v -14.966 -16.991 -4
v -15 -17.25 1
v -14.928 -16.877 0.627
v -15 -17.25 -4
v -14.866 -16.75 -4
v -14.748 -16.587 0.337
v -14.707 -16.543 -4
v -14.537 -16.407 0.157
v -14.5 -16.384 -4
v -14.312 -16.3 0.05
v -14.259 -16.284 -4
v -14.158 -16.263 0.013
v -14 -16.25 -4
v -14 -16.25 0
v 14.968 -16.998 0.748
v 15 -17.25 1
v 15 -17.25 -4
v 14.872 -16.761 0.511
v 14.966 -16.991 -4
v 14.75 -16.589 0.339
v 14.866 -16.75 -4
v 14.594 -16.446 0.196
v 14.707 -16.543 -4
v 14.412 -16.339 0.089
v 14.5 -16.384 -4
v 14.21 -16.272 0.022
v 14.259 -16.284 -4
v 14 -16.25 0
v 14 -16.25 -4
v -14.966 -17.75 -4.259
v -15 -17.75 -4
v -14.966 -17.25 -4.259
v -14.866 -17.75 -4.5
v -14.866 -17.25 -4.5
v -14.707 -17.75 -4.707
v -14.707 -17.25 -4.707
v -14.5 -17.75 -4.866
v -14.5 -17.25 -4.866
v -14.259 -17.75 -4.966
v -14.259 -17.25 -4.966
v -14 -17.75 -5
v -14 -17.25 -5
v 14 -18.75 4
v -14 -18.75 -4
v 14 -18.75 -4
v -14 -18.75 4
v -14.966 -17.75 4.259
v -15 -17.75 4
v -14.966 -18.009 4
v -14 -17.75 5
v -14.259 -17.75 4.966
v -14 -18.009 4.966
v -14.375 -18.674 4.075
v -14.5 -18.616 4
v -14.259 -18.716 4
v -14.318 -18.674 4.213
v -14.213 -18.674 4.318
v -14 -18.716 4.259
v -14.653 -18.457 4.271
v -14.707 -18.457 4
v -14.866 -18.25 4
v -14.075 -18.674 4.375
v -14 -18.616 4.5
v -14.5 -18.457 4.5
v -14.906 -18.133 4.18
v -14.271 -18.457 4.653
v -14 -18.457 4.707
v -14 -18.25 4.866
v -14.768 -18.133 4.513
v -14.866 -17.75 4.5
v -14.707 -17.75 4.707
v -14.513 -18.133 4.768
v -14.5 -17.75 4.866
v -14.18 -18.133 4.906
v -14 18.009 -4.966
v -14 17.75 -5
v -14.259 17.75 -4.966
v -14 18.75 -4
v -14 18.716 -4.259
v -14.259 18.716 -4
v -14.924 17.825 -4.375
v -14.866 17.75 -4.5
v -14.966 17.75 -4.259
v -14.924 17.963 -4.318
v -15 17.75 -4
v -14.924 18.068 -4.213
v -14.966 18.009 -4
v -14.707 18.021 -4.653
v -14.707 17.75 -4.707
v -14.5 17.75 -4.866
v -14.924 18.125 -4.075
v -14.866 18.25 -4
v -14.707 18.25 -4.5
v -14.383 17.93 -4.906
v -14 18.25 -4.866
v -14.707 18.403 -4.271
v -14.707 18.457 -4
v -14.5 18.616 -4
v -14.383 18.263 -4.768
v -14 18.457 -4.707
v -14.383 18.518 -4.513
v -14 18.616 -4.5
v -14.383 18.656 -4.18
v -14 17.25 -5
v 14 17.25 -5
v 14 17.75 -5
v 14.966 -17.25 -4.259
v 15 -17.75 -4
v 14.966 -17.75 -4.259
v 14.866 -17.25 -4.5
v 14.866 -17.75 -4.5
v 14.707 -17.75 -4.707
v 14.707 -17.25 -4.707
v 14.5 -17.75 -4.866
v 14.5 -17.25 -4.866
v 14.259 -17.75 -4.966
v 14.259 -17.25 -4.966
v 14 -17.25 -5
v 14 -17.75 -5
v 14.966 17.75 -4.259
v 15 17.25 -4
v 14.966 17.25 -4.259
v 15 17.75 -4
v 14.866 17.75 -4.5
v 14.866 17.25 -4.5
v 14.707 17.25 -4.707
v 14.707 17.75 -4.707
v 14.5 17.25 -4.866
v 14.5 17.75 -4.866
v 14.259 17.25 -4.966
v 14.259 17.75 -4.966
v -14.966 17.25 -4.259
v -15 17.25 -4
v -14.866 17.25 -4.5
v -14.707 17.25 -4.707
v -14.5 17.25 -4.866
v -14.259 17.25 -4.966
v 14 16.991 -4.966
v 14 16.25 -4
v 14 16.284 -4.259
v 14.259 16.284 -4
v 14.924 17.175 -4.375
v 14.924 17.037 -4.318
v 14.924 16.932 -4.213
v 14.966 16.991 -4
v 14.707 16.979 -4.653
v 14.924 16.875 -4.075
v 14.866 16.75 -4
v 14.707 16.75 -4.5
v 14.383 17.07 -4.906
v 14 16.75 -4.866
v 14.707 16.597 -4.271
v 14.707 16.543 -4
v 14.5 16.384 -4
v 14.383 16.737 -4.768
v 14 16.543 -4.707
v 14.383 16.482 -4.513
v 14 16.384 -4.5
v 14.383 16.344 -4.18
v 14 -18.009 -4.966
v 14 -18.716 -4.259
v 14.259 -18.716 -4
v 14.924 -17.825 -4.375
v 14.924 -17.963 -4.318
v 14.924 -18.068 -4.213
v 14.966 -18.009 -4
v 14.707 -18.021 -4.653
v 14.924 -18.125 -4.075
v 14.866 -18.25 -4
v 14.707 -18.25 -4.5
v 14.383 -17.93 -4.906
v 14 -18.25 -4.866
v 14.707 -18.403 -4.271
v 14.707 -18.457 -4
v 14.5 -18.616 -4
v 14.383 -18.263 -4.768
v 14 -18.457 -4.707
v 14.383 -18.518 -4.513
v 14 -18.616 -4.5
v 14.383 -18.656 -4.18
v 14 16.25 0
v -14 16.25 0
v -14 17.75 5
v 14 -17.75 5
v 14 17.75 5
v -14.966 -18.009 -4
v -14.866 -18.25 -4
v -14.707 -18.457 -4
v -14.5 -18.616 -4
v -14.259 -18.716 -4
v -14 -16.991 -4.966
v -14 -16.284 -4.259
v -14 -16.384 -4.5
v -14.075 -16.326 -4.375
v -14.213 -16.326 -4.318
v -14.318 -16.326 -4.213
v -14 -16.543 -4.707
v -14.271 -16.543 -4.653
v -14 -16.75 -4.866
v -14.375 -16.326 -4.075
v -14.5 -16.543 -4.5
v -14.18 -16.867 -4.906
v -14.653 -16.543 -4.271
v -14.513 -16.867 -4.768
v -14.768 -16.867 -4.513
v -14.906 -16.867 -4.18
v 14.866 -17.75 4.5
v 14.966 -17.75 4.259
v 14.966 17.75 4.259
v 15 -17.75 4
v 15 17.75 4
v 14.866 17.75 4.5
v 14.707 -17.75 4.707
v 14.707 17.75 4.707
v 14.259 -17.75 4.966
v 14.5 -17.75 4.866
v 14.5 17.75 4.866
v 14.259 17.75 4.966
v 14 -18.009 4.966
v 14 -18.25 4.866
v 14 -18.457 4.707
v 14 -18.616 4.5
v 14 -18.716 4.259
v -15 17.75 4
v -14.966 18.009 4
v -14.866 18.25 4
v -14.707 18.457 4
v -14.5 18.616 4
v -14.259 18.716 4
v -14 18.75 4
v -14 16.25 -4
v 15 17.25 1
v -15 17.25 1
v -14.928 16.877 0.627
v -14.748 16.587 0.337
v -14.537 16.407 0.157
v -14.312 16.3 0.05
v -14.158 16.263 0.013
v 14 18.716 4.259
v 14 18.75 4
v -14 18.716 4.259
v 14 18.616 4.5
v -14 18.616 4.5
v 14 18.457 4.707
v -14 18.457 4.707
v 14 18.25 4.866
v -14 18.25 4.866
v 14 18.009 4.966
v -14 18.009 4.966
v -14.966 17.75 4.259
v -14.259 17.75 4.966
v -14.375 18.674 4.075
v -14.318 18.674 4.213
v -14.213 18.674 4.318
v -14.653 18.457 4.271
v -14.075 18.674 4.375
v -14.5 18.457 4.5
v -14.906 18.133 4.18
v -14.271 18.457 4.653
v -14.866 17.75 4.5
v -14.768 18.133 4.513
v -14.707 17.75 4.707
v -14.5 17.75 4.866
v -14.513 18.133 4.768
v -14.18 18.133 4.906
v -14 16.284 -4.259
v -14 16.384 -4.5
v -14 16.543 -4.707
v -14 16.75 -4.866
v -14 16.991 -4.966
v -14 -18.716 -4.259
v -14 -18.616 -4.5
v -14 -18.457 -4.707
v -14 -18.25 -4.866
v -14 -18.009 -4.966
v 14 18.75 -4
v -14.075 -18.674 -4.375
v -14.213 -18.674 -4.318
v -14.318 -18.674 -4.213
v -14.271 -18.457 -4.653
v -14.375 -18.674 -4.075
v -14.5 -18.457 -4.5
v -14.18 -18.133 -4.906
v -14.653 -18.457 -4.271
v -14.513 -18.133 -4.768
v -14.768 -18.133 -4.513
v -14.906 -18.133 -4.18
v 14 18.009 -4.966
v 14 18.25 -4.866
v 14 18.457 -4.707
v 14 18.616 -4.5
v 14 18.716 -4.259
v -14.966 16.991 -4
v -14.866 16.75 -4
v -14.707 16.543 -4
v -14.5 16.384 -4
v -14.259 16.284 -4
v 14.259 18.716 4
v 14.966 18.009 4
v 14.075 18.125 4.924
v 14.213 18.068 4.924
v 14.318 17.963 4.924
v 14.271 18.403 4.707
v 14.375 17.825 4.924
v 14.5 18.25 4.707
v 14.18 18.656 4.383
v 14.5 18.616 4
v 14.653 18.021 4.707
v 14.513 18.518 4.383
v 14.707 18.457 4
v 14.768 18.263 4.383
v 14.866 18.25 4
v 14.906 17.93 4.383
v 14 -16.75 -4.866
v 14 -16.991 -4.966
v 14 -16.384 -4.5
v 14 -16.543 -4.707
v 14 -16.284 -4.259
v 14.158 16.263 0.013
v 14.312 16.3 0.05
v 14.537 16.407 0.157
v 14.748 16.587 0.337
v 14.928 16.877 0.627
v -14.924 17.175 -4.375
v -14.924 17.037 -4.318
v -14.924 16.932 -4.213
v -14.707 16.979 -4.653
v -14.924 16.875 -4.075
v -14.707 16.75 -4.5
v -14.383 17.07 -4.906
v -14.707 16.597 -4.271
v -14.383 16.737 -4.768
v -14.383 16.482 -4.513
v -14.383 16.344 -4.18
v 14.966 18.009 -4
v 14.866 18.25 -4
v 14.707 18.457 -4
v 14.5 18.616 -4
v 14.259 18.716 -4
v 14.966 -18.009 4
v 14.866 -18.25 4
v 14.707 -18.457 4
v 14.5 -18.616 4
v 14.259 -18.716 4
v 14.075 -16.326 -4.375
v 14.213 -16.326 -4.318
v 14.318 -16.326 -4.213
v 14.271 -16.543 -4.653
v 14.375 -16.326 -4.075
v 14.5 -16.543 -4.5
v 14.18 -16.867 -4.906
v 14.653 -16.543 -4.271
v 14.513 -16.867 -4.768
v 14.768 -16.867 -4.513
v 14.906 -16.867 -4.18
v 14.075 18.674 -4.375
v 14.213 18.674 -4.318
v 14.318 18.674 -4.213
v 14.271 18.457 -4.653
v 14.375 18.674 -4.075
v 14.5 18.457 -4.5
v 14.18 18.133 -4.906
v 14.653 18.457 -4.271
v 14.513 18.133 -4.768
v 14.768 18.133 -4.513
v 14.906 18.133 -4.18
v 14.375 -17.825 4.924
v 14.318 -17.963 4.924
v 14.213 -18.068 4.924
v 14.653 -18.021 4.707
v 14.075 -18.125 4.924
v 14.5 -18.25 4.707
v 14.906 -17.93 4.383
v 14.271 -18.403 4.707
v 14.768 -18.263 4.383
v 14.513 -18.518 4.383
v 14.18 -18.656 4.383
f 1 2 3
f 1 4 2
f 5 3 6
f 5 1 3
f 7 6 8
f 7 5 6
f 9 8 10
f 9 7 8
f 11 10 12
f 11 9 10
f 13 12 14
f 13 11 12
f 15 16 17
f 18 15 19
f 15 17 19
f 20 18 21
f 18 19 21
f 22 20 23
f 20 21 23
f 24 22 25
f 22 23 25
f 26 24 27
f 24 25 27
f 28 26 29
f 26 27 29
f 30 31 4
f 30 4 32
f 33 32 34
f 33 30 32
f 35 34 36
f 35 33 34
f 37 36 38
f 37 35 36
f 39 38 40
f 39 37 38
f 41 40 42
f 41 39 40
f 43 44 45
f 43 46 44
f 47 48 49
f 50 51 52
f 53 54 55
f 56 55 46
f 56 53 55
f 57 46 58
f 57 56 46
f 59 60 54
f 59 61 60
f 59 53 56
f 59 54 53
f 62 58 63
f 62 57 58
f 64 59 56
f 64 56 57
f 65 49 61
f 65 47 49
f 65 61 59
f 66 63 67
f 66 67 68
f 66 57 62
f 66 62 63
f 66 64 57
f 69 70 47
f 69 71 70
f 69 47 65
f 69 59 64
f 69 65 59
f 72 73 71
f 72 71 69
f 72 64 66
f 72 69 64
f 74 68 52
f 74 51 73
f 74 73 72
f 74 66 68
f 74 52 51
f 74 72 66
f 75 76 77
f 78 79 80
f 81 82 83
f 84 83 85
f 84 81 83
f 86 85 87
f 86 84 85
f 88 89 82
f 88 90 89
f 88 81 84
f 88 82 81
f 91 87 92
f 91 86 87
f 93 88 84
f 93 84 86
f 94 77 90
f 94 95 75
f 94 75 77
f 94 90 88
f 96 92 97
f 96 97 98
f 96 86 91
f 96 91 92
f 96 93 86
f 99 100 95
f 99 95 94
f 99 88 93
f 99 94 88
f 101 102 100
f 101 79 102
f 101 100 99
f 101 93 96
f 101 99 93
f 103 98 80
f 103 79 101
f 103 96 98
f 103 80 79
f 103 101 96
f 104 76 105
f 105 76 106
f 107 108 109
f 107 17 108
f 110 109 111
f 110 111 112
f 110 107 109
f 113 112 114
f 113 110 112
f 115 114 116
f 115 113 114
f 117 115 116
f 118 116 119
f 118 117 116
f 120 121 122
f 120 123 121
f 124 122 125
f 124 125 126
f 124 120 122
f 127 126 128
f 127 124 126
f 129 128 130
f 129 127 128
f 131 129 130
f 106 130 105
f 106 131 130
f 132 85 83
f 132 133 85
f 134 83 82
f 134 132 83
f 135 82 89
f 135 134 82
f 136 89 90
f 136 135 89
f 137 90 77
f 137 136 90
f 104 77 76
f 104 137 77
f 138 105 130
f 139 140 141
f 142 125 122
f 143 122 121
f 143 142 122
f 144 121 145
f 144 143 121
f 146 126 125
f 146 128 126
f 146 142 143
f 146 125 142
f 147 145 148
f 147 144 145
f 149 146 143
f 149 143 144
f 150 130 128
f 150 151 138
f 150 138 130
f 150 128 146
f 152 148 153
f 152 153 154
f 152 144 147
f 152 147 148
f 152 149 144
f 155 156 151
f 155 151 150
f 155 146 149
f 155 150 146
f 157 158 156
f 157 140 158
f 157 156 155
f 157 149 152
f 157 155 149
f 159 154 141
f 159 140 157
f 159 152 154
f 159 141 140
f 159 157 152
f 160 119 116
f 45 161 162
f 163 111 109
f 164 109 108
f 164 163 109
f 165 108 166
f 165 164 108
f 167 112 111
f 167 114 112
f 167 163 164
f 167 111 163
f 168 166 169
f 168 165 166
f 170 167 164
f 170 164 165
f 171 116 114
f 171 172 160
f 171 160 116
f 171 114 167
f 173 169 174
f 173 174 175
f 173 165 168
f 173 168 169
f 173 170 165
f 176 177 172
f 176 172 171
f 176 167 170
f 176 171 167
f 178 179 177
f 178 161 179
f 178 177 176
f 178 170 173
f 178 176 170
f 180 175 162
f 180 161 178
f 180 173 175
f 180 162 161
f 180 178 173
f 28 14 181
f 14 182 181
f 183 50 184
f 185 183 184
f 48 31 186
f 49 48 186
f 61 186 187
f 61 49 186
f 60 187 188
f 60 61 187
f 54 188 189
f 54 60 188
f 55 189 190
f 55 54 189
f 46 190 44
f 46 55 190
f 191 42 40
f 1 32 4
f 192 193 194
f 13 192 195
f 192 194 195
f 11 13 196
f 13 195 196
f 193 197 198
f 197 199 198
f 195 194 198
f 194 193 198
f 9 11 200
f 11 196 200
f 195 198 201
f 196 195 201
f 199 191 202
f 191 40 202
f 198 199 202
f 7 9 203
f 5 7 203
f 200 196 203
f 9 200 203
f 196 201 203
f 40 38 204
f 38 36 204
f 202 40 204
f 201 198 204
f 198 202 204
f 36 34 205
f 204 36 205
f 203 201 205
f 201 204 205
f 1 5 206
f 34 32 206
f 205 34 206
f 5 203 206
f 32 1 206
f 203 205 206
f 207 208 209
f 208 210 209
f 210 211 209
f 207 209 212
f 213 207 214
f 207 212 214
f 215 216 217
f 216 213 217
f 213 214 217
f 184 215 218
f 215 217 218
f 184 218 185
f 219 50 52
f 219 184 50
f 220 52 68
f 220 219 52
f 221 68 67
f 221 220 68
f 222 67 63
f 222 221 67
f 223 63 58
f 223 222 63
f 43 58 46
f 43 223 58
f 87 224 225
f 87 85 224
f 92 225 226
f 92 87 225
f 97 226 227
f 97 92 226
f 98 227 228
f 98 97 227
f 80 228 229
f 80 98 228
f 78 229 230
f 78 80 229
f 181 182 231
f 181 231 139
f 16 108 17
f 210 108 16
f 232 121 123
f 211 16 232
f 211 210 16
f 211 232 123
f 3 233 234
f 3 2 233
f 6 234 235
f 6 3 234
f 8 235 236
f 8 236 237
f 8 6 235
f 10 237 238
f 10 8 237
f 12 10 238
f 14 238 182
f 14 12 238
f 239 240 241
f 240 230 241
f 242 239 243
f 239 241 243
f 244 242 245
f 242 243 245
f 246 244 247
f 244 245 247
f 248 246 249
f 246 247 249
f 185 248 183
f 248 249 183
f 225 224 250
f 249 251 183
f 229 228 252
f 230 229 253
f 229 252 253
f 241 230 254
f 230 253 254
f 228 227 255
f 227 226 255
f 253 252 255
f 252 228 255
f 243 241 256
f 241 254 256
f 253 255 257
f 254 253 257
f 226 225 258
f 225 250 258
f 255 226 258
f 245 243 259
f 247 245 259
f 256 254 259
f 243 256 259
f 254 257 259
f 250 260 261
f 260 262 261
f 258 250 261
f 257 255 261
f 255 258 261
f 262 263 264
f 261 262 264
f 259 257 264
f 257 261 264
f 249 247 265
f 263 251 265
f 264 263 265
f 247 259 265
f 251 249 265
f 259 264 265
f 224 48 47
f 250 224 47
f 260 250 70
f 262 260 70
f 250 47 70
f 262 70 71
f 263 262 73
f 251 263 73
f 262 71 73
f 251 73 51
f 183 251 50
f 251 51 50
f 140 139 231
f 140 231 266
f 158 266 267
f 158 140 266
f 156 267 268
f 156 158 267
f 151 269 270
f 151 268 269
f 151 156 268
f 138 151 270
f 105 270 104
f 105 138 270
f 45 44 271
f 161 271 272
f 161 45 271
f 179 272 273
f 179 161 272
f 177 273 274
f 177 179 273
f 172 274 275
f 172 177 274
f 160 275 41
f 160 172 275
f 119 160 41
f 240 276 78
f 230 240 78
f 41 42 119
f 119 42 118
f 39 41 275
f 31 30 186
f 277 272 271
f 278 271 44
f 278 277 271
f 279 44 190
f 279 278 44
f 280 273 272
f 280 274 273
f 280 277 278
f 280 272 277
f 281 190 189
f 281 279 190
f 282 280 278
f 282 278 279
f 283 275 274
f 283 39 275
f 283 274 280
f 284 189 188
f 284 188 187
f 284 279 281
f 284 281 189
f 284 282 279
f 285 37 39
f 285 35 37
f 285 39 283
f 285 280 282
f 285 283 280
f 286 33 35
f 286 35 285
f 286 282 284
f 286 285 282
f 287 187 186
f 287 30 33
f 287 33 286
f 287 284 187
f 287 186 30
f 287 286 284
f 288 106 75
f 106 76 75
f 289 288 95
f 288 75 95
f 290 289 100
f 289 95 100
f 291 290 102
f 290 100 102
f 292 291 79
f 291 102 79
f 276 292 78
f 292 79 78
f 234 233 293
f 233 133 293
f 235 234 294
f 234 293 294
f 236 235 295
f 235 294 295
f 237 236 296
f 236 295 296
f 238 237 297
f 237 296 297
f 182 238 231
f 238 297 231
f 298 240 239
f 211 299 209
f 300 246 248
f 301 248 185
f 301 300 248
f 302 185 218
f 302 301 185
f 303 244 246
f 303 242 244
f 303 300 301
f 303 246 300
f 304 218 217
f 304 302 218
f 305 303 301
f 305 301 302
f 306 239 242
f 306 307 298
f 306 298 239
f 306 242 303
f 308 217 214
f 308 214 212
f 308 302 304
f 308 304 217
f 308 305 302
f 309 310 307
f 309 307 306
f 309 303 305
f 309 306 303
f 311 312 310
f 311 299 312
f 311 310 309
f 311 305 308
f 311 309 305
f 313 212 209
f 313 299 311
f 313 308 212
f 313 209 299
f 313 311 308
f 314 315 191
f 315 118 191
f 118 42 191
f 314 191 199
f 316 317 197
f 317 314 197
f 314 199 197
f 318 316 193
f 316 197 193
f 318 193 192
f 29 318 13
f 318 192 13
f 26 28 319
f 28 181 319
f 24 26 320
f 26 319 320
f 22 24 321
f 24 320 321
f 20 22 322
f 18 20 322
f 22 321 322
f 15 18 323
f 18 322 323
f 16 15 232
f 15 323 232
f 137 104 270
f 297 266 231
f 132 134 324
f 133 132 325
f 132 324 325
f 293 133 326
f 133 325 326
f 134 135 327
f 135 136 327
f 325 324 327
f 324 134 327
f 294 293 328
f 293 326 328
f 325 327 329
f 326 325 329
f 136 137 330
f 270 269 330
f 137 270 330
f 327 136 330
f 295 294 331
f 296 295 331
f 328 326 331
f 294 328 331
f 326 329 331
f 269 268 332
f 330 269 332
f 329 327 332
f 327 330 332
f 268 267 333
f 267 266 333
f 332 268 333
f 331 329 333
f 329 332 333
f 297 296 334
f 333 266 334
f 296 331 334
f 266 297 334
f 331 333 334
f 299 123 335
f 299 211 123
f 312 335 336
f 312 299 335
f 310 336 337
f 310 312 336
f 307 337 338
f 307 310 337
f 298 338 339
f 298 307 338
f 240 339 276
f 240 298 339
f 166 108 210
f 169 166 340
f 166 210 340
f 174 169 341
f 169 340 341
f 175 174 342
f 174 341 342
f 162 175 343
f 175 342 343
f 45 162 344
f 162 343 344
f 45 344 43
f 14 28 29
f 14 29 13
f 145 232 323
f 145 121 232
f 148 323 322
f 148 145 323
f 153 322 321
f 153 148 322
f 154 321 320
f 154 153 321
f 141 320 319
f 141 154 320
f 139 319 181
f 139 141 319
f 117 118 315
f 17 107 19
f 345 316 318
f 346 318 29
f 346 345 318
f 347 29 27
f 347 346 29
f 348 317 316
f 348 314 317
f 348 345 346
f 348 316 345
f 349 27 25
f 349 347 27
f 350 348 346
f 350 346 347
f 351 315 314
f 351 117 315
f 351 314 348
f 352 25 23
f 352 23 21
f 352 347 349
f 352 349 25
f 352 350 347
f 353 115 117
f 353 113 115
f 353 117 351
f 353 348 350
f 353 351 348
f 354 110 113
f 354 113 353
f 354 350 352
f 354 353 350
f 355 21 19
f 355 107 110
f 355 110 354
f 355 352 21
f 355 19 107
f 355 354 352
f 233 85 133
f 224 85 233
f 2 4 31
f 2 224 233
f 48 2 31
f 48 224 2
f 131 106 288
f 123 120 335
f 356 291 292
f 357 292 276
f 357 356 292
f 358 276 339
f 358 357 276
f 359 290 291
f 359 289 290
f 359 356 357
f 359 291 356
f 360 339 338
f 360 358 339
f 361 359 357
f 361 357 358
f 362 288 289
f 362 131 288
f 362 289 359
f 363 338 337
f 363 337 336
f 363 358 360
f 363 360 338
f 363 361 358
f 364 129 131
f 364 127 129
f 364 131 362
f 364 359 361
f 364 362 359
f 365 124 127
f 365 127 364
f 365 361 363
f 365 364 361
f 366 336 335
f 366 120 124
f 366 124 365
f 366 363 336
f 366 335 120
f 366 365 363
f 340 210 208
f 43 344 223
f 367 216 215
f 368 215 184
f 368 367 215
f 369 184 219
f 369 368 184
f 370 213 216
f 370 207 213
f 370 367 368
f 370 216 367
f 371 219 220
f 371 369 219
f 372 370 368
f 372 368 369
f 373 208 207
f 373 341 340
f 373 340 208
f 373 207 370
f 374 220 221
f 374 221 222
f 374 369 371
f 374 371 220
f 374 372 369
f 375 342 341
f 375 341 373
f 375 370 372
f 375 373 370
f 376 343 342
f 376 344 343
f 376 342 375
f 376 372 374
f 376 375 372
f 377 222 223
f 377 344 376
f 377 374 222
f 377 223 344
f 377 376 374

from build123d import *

# Parameters (mm, degrees)
F0_W     = 25
F0_H     = 32.5
F0_W_2   = 2.5
F1_DEPTH = 5
F2_DEPTH = 5
F3_R     = 1


with BuildPart() as f1:
    # F0 (on Top) → F1 (new body)
    with BuildSketch(Plane.XY):
        Rectangle(F0_W, F0_H)
        Polygon((-15, 16.25), (-12.5, 16.25), (12.5, 16.25), (15, 16.25), (15, 18.75), (-15, 18.75), align=None)
        with Locations((-13.75, 0)):
            Rectangle(F0_W_2, F0_H)
        Polygon((12.5, -16.25), (-12.5, -16.25), (-15, -16.25), (-15, -18.75), (15, -18.75), (15, -16.25), align=None)
        with Locations((13.75, 0)):
            Rectangle(F0_W_2, F0_H)
    extrude(amount=F1_DEPTH)

    # F0 (on Top) → F2 (join)
    with BuildSketch(Plane.XY):
        Polygon((12.5, -16.25), (-12.5, -16.25), (-15, -16.25), (-15, -18.75), (15, -18.75), (15, -16.25), align=None)
        Polygon((-15, 16.25), (-12.5, 16.25), (12.5, 16.25), (15, 16.25), (15, 18.75), (-15, 18.75), align=None)
    extrude(amount=-F2_DEPTH)

    # F3
    f3_edges = [f1.edges().sort_by_distance(p)[0] for p in [
        (0, 16.25, -5),
        (15, 17.5, -5),
        (0, 18.75, -5),
        (-15, 17.5, -5),
        (-15, -17.5, -5),
        (0, -18.75, -5),
        (15, -17.5, -5),
        (0, -16.25, -5),
        (-15, 0, 5),
        (-15, -18.75, 0),
        (-15, -16.25, -2.5),
        (-15, 0, 0),
        (-15, 16.25, -2.5),
        (-15, 18.75, 0),
        (15, 18.75, 0),
        (0, 18.75, 5),
        (15, -18.75, 0),
        (15, 0, 5),
        (15, 16.25, -2.5),
        (15, 0, 0),
        (15, -16.25, -2.5),
        (0, -18.75, 5),
    ]]
    fillet(f3_edges, radius=F3_R)


solid = f1.part
